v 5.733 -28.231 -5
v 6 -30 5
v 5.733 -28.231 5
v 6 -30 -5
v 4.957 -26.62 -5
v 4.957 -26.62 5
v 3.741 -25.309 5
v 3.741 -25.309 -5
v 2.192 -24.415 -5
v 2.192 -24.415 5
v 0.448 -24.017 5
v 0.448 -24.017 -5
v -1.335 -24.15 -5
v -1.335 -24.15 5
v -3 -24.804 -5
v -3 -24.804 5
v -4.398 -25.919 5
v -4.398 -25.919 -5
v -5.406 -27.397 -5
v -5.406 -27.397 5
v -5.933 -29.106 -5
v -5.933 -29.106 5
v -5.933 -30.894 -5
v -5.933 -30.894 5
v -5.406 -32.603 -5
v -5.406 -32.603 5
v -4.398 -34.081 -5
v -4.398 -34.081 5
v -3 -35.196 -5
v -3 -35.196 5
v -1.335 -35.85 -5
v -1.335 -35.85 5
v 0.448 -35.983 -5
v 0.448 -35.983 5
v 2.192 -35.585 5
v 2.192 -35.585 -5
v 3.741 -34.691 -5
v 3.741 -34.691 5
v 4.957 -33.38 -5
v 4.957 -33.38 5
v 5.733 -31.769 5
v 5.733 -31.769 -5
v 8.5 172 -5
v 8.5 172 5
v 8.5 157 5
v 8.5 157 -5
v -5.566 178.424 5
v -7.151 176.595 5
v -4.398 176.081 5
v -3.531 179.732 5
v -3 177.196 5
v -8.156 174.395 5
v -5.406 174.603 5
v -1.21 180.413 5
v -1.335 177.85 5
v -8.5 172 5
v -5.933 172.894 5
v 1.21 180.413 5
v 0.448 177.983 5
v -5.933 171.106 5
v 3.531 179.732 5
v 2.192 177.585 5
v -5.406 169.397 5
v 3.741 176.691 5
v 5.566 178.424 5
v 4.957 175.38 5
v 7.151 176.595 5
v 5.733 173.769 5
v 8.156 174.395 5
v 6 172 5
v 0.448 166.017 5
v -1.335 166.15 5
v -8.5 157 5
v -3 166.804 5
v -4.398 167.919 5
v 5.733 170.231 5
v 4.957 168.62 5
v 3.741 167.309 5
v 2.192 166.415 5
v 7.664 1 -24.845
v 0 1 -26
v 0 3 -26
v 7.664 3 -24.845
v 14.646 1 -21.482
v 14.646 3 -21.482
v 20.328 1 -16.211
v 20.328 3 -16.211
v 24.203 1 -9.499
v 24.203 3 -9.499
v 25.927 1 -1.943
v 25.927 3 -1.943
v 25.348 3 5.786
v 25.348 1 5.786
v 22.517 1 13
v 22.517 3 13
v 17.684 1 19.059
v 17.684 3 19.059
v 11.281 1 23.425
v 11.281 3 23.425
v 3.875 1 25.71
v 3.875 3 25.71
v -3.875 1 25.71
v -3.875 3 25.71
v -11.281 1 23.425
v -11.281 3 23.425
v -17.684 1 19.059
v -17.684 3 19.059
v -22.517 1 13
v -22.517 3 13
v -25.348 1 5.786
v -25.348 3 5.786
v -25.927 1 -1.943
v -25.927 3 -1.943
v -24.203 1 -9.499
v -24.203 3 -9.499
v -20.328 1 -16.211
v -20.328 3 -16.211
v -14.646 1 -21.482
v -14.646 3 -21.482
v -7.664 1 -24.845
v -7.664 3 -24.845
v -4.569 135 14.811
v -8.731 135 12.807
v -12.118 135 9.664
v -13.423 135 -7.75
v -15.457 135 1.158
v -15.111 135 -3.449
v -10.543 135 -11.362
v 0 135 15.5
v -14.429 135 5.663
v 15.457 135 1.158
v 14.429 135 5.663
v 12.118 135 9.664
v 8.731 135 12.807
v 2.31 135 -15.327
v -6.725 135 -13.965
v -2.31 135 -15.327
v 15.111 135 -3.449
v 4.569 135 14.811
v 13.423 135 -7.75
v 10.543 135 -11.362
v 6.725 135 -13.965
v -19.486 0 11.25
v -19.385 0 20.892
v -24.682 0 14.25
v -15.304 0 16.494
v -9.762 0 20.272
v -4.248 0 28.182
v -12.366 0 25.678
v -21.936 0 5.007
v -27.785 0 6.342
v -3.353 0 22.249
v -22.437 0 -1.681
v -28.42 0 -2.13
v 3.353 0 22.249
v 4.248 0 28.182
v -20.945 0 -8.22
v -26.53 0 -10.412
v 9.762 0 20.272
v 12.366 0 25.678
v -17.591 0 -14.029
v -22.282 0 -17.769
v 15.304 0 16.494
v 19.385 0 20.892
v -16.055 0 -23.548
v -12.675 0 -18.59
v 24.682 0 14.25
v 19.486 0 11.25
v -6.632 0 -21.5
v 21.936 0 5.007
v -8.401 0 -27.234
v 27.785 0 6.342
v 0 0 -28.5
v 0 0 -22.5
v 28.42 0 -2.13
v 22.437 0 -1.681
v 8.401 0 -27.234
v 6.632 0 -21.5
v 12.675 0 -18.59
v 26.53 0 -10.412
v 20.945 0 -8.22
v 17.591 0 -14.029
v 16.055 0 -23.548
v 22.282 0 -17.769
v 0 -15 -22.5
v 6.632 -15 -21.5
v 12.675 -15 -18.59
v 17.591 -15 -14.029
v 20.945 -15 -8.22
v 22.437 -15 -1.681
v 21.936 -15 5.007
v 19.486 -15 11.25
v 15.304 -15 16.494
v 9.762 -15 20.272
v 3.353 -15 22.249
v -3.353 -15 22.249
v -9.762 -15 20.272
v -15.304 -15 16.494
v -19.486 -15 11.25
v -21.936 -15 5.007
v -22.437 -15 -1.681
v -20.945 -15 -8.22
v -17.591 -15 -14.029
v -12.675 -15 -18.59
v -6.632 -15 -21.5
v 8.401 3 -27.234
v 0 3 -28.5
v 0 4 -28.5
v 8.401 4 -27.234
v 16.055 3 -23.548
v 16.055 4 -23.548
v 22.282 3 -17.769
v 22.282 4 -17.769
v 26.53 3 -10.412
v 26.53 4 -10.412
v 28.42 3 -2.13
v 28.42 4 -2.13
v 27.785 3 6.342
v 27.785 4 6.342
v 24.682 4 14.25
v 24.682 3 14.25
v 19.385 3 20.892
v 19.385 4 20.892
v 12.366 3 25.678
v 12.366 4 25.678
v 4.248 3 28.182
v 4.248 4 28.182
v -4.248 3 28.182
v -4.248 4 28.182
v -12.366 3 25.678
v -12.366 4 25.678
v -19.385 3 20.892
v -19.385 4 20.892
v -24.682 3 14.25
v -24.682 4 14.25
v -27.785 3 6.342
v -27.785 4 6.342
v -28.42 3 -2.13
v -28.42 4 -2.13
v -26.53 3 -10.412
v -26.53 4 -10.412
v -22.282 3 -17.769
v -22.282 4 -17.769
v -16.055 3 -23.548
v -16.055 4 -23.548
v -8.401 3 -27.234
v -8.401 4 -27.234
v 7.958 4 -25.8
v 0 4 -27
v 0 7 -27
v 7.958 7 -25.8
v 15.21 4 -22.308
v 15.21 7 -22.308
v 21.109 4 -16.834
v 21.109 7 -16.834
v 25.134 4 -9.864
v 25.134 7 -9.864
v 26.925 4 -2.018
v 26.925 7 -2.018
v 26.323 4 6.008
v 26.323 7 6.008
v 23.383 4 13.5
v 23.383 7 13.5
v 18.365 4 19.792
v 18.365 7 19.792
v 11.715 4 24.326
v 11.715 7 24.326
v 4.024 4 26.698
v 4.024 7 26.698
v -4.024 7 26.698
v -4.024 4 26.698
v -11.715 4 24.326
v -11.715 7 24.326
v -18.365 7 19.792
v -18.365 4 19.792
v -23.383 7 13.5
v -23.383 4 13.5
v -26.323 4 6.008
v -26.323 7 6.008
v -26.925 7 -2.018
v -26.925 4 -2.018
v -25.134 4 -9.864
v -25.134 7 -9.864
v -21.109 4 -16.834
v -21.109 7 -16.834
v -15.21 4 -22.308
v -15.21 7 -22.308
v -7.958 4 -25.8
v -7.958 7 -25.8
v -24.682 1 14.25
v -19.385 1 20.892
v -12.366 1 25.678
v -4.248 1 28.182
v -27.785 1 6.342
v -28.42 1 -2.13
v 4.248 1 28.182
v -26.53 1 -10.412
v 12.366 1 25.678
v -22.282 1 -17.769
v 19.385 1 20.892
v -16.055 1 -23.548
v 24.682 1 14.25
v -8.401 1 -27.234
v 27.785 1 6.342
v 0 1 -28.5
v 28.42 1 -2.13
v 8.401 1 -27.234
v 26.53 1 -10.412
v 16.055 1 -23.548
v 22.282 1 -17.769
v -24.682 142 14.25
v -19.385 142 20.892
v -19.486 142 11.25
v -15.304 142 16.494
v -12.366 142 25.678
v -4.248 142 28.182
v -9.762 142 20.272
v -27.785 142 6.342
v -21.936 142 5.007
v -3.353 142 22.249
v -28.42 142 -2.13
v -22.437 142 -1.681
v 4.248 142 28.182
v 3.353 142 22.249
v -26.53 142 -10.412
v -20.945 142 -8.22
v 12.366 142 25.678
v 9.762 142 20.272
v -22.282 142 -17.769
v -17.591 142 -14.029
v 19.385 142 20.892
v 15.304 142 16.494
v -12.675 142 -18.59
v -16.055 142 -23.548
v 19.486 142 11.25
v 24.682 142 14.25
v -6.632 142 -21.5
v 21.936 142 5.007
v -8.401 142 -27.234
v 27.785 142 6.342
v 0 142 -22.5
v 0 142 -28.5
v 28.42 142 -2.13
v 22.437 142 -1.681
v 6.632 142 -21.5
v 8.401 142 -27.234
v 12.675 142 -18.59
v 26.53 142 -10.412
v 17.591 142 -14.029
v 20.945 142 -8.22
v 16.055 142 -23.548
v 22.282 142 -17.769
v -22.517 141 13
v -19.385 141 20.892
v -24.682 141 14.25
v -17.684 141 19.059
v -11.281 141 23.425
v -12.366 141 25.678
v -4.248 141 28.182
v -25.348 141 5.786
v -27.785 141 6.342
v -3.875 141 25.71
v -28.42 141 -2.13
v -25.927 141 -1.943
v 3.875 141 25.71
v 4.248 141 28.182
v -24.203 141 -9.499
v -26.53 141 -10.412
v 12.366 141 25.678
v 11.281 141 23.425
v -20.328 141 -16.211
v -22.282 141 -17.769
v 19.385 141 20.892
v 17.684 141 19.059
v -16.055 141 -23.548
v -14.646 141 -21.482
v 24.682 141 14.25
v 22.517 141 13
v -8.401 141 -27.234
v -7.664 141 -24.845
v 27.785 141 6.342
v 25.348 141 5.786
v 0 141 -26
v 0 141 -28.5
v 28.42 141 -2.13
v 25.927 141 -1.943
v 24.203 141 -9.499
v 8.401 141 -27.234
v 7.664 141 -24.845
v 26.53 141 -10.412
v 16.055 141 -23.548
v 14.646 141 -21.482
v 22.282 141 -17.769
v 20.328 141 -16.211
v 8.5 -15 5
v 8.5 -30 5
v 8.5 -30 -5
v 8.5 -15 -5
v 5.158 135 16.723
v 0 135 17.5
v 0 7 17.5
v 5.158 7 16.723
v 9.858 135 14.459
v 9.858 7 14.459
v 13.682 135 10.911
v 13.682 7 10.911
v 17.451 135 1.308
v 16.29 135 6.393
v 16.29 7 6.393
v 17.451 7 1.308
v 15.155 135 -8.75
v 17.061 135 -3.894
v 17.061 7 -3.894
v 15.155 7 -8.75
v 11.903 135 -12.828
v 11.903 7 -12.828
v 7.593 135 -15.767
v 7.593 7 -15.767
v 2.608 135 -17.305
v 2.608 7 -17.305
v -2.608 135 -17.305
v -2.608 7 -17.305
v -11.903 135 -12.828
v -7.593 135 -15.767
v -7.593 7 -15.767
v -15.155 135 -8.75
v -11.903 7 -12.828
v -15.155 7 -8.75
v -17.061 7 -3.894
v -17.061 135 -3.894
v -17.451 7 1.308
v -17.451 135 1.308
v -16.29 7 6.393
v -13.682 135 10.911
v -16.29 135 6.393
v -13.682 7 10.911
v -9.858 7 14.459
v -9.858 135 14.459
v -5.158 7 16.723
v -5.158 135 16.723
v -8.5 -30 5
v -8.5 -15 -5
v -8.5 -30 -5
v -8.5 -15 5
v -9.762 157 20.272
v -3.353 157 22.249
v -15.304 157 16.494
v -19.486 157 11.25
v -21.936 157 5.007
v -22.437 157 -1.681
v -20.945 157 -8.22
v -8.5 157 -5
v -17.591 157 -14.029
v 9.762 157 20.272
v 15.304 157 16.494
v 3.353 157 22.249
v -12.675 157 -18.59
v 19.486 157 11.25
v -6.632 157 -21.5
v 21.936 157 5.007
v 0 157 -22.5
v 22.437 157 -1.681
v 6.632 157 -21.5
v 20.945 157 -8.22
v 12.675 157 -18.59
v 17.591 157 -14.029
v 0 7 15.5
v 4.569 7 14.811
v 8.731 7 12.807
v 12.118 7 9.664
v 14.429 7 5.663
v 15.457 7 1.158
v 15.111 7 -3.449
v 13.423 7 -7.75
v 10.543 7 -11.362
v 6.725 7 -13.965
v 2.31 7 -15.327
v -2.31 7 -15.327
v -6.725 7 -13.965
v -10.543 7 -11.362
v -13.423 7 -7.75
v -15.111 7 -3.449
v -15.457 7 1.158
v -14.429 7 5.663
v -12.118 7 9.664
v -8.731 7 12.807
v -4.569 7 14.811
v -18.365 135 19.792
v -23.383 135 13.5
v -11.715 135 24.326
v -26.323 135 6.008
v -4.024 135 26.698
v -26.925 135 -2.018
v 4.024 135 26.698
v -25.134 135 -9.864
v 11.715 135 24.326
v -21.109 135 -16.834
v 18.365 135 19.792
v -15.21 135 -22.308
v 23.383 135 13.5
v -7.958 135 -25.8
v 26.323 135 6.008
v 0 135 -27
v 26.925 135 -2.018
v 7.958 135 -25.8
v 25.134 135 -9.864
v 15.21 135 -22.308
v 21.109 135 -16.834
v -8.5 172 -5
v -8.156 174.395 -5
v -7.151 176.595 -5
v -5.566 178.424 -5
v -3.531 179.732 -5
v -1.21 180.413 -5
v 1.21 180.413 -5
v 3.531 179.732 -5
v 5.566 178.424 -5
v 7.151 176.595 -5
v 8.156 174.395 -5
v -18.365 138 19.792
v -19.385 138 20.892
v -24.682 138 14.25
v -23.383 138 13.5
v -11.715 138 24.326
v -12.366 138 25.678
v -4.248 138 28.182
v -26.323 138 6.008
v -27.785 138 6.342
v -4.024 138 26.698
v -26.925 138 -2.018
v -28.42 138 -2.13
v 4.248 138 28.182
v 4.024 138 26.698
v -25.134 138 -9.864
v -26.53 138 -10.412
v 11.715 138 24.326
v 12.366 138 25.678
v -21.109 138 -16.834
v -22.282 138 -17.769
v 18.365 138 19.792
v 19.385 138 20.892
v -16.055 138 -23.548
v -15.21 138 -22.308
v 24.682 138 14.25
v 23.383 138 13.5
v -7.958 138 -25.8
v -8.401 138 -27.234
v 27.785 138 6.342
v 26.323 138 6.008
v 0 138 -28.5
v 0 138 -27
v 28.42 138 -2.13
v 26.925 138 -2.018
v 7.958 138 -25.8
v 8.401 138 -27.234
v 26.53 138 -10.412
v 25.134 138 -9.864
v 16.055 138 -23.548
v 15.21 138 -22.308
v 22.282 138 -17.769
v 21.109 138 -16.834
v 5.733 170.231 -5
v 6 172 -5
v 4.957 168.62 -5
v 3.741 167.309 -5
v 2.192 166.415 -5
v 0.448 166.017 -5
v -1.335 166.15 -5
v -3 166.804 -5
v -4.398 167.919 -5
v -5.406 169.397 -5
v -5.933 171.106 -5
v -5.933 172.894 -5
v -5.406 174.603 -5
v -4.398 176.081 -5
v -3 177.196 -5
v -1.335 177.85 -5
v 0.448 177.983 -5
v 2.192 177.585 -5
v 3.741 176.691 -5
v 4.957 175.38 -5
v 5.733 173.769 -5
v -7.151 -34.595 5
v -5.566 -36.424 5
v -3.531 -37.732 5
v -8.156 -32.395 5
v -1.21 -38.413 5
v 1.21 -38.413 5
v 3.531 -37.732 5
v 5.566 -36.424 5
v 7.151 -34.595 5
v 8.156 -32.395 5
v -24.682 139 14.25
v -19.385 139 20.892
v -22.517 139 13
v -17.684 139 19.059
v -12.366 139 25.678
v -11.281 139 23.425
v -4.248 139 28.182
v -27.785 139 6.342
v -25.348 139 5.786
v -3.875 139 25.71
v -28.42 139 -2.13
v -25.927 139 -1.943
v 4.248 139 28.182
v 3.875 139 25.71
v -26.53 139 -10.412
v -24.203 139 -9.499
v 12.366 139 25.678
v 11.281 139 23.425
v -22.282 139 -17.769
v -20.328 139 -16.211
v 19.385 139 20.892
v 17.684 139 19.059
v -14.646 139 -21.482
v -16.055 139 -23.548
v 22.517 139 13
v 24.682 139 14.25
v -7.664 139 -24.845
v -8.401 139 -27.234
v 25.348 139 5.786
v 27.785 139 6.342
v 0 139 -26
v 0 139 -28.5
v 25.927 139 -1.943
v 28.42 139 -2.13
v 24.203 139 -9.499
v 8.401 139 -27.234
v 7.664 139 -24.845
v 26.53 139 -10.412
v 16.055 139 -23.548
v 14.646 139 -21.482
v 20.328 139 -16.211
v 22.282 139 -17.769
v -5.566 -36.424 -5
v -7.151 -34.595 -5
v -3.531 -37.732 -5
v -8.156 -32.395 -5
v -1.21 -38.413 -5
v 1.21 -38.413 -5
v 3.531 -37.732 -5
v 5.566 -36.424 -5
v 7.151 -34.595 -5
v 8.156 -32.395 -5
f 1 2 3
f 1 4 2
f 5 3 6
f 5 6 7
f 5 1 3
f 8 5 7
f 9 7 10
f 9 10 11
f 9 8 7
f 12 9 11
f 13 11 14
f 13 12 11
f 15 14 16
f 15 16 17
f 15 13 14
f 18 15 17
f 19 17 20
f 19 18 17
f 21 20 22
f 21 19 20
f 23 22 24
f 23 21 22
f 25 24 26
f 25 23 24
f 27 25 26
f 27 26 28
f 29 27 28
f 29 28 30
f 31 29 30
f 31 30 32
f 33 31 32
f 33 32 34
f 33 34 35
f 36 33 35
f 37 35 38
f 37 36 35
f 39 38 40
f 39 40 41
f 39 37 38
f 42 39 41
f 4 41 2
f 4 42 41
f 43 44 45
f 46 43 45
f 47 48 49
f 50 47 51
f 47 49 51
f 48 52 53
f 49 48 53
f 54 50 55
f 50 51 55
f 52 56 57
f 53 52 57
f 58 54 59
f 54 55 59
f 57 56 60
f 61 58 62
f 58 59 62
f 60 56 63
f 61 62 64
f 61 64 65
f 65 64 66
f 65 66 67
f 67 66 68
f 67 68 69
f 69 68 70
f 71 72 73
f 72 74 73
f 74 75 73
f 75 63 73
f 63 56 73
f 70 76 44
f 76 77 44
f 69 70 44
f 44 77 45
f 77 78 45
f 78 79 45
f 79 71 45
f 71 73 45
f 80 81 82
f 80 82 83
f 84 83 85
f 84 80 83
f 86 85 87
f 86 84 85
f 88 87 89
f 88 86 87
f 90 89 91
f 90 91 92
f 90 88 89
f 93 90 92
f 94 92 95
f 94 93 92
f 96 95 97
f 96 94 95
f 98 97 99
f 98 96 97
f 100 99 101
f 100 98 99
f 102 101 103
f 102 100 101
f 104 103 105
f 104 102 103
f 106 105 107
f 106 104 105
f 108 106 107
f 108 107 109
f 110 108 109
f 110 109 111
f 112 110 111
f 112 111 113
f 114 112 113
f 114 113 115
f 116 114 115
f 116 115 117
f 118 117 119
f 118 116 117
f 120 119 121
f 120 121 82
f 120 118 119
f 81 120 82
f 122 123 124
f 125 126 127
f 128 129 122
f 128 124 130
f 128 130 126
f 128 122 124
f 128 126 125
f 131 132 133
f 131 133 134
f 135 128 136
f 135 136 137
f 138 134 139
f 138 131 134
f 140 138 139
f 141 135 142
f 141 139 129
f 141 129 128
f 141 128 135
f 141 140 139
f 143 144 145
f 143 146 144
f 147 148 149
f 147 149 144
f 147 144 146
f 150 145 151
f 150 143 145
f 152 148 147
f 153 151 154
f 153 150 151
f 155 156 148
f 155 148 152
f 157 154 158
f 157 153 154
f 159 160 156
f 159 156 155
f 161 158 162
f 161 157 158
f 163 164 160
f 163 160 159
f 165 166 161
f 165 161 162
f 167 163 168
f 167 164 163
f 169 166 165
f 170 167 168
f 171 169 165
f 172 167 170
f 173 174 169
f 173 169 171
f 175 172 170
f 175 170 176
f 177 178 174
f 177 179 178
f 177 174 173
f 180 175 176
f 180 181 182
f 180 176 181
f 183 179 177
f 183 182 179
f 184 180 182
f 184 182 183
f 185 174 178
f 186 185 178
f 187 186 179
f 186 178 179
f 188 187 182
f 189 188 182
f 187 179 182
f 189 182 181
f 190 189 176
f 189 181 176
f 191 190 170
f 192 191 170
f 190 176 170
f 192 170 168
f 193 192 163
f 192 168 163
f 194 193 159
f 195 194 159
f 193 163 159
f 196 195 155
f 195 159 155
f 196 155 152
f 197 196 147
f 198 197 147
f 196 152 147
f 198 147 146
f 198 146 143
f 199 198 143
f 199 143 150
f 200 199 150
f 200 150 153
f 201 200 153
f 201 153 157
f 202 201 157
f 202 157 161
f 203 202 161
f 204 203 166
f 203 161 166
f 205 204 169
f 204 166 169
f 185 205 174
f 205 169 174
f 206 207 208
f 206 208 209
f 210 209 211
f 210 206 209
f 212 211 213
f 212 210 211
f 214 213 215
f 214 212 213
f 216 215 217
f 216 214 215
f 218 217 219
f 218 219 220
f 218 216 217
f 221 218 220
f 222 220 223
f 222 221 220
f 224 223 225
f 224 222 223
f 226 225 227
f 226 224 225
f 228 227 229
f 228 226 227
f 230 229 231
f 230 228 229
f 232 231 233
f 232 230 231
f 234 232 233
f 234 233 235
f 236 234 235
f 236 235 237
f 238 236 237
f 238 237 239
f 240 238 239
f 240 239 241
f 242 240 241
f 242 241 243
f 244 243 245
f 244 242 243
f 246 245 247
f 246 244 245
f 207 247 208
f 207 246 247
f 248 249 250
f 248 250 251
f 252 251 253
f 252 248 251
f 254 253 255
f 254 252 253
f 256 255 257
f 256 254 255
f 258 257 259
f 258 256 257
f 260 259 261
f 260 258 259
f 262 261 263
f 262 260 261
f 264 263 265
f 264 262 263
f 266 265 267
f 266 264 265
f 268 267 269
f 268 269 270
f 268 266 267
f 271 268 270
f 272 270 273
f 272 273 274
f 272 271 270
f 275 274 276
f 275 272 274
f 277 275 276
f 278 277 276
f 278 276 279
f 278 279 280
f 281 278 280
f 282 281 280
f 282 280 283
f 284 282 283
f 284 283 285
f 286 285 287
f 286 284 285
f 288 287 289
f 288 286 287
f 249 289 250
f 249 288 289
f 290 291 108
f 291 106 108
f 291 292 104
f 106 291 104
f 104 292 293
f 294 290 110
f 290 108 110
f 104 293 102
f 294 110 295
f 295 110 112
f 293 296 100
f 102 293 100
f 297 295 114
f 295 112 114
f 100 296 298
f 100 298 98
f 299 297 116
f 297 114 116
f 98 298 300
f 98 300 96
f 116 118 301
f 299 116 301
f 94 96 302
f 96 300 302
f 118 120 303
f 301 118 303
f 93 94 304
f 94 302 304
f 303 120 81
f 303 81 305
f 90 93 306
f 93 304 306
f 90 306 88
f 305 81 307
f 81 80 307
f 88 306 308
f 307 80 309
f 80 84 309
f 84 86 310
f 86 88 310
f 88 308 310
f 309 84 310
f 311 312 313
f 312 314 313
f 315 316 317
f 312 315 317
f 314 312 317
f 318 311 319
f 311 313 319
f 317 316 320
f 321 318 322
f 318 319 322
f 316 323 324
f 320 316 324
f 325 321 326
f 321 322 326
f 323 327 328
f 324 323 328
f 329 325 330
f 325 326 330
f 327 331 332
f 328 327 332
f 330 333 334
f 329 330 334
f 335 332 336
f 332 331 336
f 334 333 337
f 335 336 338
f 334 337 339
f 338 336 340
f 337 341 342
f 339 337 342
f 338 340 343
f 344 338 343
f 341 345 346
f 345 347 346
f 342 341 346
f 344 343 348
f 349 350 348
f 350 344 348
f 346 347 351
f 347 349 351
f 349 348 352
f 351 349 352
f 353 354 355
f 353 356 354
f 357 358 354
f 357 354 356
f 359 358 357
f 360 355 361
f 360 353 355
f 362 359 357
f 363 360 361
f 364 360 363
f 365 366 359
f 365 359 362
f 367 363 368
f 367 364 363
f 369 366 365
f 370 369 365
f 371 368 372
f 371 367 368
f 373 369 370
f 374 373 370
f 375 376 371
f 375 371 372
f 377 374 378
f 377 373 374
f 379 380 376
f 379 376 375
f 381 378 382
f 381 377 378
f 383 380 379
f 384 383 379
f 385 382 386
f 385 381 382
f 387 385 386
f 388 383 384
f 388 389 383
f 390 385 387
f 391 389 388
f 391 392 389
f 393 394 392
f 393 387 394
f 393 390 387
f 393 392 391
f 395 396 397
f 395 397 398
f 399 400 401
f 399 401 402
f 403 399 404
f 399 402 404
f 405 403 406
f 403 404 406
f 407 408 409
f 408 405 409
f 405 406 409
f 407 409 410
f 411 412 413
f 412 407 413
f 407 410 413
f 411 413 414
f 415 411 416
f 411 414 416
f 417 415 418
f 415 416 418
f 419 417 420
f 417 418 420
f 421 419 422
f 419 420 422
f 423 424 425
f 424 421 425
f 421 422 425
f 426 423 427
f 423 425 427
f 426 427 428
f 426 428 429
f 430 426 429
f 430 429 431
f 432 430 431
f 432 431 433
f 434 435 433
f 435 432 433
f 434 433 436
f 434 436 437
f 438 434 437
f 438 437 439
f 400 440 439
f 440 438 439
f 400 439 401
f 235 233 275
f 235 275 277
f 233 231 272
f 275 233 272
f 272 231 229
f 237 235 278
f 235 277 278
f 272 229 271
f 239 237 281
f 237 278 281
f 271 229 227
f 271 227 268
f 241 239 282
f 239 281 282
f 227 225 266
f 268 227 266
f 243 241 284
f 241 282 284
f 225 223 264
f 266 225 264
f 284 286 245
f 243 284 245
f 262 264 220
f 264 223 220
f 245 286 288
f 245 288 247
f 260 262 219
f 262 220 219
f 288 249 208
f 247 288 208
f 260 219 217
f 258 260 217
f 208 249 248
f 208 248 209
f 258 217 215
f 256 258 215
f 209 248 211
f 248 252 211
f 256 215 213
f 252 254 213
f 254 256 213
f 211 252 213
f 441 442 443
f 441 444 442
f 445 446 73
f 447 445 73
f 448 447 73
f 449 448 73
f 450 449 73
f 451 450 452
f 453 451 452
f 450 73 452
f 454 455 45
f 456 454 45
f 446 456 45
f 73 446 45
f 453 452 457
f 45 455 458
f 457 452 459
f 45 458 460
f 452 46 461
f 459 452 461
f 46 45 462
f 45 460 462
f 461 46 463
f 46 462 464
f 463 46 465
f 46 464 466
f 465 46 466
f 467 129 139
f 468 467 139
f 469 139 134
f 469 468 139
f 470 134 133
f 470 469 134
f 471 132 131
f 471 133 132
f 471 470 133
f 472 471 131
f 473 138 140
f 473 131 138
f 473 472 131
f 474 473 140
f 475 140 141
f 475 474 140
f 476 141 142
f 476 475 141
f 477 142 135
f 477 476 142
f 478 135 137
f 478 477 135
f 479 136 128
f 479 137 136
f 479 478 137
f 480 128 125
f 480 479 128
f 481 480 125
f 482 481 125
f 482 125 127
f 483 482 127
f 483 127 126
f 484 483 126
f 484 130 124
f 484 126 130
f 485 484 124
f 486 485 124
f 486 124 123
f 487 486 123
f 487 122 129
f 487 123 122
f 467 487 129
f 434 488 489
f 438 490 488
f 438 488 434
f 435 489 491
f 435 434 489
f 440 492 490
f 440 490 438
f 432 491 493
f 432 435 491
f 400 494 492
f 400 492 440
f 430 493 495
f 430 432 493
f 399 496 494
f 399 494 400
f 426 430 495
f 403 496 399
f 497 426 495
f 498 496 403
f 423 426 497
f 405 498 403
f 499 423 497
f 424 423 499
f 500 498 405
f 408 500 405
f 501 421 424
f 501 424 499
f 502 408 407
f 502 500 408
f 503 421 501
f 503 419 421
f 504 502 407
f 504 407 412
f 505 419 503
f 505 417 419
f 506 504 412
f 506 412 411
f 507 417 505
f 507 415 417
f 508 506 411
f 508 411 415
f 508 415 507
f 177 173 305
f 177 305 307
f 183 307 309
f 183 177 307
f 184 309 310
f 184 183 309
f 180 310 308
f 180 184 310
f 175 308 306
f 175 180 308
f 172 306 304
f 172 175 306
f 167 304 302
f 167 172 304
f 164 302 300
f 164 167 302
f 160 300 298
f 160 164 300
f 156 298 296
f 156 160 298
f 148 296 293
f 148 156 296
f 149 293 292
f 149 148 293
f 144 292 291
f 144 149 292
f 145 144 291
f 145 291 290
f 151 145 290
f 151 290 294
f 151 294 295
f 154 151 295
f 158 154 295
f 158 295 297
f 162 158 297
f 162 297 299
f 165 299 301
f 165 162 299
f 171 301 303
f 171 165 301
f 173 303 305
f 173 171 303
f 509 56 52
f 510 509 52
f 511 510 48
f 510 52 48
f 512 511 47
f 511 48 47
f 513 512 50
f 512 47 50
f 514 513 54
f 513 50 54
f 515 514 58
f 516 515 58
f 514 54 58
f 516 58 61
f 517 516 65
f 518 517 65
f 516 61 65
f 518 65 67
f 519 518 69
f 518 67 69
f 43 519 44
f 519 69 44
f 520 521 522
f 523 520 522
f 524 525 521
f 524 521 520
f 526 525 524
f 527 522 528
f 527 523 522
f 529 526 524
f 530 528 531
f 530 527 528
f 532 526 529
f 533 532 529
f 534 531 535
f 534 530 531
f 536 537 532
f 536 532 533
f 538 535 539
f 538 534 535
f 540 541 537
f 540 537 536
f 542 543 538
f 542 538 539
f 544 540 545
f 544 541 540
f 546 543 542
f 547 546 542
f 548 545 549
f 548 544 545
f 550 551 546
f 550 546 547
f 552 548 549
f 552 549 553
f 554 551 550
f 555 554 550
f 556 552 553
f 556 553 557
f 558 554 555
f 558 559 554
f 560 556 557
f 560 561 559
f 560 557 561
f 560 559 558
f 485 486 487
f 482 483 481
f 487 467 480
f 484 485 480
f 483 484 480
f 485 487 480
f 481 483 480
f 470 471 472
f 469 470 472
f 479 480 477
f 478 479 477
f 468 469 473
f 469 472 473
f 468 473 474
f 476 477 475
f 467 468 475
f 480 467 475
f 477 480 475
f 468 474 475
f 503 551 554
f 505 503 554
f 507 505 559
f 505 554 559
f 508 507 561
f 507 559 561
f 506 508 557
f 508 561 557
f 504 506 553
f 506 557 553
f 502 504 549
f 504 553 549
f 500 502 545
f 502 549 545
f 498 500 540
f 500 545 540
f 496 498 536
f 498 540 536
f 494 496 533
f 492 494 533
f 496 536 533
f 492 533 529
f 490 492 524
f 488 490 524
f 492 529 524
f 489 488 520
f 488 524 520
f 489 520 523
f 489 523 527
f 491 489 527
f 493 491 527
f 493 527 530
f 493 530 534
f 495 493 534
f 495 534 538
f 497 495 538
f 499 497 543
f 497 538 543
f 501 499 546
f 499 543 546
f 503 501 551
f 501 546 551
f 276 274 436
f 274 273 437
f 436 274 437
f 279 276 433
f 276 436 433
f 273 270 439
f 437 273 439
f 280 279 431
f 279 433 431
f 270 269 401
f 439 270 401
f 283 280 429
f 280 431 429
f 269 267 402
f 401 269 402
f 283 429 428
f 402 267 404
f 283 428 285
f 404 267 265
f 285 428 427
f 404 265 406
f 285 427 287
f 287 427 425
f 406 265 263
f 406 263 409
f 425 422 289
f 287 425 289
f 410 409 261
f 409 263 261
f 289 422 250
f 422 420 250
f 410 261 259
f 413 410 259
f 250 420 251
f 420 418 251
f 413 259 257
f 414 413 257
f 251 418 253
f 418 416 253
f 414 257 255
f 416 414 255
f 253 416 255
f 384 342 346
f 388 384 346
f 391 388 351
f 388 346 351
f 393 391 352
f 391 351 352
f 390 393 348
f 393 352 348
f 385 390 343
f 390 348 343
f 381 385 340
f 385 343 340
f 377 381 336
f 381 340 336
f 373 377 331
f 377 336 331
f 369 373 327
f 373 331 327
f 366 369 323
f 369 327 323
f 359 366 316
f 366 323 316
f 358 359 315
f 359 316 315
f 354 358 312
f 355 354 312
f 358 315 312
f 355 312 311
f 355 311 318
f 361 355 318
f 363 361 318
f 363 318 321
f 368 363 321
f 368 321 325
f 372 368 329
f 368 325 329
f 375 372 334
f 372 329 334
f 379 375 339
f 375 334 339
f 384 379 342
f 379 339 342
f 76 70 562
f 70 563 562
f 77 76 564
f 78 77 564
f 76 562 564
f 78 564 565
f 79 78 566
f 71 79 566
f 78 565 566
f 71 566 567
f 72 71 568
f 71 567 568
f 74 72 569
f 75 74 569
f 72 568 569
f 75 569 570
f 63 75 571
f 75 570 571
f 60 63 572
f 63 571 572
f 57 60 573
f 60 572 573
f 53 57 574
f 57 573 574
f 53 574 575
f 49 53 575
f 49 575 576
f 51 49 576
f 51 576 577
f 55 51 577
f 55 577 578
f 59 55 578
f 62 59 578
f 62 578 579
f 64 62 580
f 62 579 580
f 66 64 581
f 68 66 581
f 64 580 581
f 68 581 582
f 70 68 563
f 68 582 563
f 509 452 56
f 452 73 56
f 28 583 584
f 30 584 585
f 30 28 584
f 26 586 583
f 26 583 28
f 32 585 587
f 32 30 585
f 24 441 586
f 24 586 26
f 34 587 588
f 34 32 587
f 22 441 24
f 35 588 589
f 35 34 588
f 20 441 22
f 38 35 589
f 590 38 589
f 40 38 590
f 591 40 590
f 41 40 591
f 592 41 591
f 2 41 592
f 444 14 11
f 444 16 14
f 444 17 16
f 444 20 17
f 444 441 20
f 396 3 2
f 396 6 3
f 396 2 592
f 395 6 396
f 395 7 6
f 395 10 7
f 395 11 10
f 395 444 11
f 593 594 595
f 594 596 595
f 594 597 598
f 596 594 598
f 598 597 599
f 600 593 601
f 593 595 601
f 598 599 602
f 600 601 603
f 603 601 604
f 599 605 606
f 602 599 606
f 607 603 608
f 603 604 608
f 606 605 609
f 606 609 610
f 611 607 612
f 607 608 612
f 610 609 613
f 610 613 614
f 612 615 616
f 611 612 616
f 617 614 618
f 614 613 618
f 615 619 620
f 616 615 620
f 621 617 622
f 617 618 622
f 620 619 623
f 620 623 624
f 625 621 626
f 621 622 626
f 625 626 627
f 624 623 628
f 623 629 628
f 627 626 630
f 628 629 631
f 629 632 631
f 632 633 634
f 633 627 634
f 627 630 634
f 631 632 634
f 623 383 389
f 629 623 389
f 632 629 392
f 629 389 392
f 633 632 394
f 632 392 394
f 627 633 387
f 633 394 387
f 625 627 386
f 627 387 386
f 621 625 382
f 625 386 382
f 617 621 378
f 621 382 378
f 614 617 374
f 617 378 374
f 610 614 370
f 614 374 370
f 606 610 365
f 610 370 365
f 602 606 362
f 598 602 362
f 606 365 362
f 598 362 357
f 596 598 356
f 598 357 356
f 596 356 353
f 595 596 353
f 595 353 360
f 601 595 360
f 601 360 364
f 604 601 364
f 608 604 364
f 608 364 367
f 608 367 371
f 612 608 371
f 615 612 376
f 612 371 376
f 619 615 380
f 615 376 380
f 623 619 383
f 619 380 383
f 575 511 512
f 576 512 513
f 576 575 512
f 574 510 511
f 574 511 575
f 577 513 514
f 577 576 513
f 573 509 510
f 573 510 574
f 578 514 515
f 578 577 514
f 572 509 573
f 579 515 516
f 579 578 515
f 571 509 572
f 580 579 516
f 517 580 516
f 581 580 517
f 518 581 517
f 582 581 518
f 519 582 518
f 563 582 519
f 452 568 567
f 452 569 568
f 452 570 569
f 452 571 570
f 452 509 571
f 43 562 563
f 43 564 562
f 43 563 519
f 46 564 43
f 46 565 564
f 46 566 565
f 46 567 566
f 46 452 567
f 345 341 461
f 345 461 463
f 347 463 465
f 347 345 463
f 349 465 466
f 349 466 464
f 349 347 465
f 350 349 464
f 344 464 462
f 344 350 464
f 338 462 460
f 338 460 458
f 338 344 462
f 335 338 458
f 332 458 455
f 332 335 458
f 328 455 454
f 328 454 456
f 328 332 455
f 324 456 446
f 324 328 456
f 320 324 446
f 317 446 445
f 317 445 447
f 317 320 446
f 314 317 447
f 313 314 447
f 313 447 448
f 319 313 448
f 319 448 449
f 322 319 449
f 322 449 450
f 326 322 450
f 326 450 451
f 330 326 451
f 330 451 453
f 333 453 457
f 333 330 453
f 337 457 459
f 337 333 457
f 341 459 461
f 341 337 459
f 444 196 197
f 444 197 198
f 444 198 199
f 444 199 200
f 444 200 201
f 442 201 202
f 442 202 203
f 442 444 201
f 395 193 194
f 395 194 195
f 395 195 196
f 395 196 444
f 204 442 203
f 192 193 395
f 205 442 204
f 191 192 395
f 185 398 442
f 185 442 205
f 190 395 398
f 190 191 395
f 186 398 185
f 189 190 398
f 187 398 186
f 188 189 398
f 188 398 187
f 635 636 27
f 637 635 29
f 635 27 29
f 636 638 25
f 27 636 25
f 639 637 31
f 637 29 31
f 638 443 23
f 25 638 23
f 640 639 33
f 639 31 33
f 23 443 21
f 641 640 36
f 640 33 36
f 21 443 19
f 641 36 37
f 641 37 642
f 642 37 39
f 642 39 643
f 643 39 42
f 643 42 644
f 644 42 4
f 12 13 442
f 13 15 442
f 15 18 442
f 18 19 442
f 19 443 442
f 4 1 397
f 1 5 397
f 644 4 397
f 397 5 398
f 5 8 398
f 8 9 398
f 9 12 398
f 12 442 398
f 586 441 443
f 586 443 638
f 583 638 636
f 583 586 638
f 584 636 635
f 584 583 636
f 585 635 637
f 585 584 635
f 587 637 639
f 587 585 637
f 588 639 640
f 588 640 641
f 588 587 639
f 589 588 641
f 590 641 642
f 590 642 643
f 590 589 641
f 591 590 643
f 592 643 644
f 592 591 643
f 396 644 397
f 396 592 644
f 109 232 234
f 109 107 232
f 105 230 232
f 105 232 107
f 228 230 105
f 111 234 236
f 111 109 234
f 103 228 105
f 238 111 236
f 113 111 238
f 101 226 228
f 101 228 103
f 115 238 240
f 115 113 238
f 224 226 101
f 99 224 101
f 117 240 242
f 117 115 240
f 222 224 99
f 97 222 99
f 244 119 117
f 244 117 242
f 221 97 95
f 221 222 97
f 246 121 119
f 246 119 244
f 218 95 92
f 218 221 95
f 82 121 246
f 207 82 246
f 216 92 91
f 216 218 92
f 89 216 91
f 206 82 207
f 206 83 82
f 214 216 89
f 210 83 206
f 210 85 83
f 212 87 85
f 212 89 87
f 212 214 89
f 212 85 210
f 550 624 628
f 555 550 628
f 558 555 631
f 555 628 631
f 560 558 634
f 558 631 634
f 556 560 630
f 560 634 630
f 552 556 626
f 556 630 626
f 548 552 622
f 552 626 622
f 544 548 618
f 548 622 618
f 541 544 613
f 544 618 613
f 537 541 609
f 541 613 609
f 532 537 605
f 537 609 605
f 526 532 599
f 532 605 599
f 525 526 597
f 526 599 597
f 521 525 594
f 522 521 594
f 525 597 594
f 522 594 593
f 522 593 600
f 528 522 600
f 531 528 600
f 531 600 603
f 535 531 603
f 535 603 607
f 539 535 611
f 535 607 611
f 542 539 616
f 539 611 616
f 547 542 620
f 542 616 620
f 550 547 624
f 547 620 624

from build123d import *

# Parameters (mm, degrees)
SKETCH1_R           = 17.5
BOSS_EXTRUDE1_DEPTH = 142
SHELL1_T            = -2
SKETCH2_R           = 22.5
BOSS_EXTRUDE2_DEPTH = 15
SKETCH3_R           = 6
BOSS_EXTRUDE3_DEPTH = 5
SKETCH4_R           = 28.5
BOSS_EXTRUDE4_DEPTH = 1
SKETCH5_R           = 26
BOSS_EXTRUDE5_DEPTH = 2
SKETCH6_R           = 28.5
BOSS_EXTRUDE6_DEPTH = 1
SKETCH7_R           = 27
BOSS_EXTRUDE7_DEPTH = 3


with BuildPart() as part:
    # Sketch1 → Boss-Extrude1 (new body)
    with BuildSketch(Plane(origin=(0, 0, 0), x_dir=(1, 0, 0), z_dir=(0, 1, 0))):
        with Locations(Location((0, 0, 0), (0, 0, 270))):
            Circle(SKETCH1_R)
    extrude(amount=BOSS_EXTRUDE1_DEPTH)

    # Shell1
    shell1_openings = [part.faces().sort_by_distance(p)[0] for p in [
        (0, 142, 0),
        (0, 0, 0),
    ]]
    offset(amount=SHELL1_T, openings=shell1_openings, kind=Kind.INTERSECTION)

    # Sketch2 → Boss-Extrude2 (add)
    with BuildSketch(Plane.XZ):
        with Locations(Location((0, 0, 0), (0, 0, 270))):
            Circle(SKETCH2_R)
    boss_extrude2 = extrude(amount=BOSS_EXTRUDE2_DEPTH)

    # Sketch3 → Boss-Extrude3 (add, symmetric)
    with BuildSketch(Plane.XY):
        with BuildLine():
            Line((-8.5, -15), (-8.5, -30))
            ThreePointArc((-8.5, -30), (0, -38.5), (8.5, -30))
            Line((8.5, -30), (8.5, -15))
            Line((8.5, -15), (-8.5, -15))
        make_face()
        with Locations((0, -30)):
            Circle(SKETCH3_R, mode=Mode.SUBTRACT)
    boss_extrude3 = extrude(amount=BOSS_EXTRUDE3_DEPTH, both=True)

    # Mirror1: Boss-Extrude2, Boss-Extrude3 across plane
    add(boss_extrude2.mirror(Plane.ZX.offset(71)))
    add(boss_extrude3.mirror(Plane.ZX.offset(71)))

    # Sketch4 → Boss-Extrude4 (add)
    with BuildSketch(Plane.XZ.offset(-142)):
        with Locations(Location((0, 0, 0), (0, 0, 270))):
            Circle(SKETCH4_R)
    boss_extrude4 = extrude(amount=BOSS_EXTRUDE4_DEPTH)

    # Sketch5 → Boss-Extrude5 (add)
    with BuildSketch(Plane.XZ.offset(-141)):
        with Locations(Location((0, 0, 0), (0, 0, 270))):
            Circle(SKETCH5_R)
    boss_extrude5 = extrude(amount=BOSS_EXTRUDE5_DEPTH)

    # Sketch6 → Boss-Extrude6 (add)
    with BuildSketch(Plane.XZ.offset(-139)):
        with Locations(Location((0, 0, 0), (0, 0, 270))):
            Circle(SKETCH6_R)
    boss_extrude6 = extrude(amount=BOSS_EXTRUDE6_DEPTH)

    # Mirror2: Boss-Extrude4, Boss-Extrude5, Boss-Extrude6 across plane
    add(boss_extrude4.mirror(Plane.ZX.offset(71)))
    add(boss_extrude5.mirror(Plane.ZX.offset(71)))
    add(boss_extrude6.mirror(Plane.ZX.offset(71)))

    # Sketch7 → Boss-Extrude7 (add)
    with BuildSketch(Plane.XZ.offset(-138)):
        with Locations(Location((0, 0, 0), (0, 0, 270))):
            Circle(SKETCH7_R)
    boss_extrude7 = extrude(amount=BOSS_EXTRUDE7_DEPTH)

    # Mirror3: Boss-Extrude7 across plane
    add(boss_extrude7.mirror(Plane.ZX.offset(71)))


solid = part.part
